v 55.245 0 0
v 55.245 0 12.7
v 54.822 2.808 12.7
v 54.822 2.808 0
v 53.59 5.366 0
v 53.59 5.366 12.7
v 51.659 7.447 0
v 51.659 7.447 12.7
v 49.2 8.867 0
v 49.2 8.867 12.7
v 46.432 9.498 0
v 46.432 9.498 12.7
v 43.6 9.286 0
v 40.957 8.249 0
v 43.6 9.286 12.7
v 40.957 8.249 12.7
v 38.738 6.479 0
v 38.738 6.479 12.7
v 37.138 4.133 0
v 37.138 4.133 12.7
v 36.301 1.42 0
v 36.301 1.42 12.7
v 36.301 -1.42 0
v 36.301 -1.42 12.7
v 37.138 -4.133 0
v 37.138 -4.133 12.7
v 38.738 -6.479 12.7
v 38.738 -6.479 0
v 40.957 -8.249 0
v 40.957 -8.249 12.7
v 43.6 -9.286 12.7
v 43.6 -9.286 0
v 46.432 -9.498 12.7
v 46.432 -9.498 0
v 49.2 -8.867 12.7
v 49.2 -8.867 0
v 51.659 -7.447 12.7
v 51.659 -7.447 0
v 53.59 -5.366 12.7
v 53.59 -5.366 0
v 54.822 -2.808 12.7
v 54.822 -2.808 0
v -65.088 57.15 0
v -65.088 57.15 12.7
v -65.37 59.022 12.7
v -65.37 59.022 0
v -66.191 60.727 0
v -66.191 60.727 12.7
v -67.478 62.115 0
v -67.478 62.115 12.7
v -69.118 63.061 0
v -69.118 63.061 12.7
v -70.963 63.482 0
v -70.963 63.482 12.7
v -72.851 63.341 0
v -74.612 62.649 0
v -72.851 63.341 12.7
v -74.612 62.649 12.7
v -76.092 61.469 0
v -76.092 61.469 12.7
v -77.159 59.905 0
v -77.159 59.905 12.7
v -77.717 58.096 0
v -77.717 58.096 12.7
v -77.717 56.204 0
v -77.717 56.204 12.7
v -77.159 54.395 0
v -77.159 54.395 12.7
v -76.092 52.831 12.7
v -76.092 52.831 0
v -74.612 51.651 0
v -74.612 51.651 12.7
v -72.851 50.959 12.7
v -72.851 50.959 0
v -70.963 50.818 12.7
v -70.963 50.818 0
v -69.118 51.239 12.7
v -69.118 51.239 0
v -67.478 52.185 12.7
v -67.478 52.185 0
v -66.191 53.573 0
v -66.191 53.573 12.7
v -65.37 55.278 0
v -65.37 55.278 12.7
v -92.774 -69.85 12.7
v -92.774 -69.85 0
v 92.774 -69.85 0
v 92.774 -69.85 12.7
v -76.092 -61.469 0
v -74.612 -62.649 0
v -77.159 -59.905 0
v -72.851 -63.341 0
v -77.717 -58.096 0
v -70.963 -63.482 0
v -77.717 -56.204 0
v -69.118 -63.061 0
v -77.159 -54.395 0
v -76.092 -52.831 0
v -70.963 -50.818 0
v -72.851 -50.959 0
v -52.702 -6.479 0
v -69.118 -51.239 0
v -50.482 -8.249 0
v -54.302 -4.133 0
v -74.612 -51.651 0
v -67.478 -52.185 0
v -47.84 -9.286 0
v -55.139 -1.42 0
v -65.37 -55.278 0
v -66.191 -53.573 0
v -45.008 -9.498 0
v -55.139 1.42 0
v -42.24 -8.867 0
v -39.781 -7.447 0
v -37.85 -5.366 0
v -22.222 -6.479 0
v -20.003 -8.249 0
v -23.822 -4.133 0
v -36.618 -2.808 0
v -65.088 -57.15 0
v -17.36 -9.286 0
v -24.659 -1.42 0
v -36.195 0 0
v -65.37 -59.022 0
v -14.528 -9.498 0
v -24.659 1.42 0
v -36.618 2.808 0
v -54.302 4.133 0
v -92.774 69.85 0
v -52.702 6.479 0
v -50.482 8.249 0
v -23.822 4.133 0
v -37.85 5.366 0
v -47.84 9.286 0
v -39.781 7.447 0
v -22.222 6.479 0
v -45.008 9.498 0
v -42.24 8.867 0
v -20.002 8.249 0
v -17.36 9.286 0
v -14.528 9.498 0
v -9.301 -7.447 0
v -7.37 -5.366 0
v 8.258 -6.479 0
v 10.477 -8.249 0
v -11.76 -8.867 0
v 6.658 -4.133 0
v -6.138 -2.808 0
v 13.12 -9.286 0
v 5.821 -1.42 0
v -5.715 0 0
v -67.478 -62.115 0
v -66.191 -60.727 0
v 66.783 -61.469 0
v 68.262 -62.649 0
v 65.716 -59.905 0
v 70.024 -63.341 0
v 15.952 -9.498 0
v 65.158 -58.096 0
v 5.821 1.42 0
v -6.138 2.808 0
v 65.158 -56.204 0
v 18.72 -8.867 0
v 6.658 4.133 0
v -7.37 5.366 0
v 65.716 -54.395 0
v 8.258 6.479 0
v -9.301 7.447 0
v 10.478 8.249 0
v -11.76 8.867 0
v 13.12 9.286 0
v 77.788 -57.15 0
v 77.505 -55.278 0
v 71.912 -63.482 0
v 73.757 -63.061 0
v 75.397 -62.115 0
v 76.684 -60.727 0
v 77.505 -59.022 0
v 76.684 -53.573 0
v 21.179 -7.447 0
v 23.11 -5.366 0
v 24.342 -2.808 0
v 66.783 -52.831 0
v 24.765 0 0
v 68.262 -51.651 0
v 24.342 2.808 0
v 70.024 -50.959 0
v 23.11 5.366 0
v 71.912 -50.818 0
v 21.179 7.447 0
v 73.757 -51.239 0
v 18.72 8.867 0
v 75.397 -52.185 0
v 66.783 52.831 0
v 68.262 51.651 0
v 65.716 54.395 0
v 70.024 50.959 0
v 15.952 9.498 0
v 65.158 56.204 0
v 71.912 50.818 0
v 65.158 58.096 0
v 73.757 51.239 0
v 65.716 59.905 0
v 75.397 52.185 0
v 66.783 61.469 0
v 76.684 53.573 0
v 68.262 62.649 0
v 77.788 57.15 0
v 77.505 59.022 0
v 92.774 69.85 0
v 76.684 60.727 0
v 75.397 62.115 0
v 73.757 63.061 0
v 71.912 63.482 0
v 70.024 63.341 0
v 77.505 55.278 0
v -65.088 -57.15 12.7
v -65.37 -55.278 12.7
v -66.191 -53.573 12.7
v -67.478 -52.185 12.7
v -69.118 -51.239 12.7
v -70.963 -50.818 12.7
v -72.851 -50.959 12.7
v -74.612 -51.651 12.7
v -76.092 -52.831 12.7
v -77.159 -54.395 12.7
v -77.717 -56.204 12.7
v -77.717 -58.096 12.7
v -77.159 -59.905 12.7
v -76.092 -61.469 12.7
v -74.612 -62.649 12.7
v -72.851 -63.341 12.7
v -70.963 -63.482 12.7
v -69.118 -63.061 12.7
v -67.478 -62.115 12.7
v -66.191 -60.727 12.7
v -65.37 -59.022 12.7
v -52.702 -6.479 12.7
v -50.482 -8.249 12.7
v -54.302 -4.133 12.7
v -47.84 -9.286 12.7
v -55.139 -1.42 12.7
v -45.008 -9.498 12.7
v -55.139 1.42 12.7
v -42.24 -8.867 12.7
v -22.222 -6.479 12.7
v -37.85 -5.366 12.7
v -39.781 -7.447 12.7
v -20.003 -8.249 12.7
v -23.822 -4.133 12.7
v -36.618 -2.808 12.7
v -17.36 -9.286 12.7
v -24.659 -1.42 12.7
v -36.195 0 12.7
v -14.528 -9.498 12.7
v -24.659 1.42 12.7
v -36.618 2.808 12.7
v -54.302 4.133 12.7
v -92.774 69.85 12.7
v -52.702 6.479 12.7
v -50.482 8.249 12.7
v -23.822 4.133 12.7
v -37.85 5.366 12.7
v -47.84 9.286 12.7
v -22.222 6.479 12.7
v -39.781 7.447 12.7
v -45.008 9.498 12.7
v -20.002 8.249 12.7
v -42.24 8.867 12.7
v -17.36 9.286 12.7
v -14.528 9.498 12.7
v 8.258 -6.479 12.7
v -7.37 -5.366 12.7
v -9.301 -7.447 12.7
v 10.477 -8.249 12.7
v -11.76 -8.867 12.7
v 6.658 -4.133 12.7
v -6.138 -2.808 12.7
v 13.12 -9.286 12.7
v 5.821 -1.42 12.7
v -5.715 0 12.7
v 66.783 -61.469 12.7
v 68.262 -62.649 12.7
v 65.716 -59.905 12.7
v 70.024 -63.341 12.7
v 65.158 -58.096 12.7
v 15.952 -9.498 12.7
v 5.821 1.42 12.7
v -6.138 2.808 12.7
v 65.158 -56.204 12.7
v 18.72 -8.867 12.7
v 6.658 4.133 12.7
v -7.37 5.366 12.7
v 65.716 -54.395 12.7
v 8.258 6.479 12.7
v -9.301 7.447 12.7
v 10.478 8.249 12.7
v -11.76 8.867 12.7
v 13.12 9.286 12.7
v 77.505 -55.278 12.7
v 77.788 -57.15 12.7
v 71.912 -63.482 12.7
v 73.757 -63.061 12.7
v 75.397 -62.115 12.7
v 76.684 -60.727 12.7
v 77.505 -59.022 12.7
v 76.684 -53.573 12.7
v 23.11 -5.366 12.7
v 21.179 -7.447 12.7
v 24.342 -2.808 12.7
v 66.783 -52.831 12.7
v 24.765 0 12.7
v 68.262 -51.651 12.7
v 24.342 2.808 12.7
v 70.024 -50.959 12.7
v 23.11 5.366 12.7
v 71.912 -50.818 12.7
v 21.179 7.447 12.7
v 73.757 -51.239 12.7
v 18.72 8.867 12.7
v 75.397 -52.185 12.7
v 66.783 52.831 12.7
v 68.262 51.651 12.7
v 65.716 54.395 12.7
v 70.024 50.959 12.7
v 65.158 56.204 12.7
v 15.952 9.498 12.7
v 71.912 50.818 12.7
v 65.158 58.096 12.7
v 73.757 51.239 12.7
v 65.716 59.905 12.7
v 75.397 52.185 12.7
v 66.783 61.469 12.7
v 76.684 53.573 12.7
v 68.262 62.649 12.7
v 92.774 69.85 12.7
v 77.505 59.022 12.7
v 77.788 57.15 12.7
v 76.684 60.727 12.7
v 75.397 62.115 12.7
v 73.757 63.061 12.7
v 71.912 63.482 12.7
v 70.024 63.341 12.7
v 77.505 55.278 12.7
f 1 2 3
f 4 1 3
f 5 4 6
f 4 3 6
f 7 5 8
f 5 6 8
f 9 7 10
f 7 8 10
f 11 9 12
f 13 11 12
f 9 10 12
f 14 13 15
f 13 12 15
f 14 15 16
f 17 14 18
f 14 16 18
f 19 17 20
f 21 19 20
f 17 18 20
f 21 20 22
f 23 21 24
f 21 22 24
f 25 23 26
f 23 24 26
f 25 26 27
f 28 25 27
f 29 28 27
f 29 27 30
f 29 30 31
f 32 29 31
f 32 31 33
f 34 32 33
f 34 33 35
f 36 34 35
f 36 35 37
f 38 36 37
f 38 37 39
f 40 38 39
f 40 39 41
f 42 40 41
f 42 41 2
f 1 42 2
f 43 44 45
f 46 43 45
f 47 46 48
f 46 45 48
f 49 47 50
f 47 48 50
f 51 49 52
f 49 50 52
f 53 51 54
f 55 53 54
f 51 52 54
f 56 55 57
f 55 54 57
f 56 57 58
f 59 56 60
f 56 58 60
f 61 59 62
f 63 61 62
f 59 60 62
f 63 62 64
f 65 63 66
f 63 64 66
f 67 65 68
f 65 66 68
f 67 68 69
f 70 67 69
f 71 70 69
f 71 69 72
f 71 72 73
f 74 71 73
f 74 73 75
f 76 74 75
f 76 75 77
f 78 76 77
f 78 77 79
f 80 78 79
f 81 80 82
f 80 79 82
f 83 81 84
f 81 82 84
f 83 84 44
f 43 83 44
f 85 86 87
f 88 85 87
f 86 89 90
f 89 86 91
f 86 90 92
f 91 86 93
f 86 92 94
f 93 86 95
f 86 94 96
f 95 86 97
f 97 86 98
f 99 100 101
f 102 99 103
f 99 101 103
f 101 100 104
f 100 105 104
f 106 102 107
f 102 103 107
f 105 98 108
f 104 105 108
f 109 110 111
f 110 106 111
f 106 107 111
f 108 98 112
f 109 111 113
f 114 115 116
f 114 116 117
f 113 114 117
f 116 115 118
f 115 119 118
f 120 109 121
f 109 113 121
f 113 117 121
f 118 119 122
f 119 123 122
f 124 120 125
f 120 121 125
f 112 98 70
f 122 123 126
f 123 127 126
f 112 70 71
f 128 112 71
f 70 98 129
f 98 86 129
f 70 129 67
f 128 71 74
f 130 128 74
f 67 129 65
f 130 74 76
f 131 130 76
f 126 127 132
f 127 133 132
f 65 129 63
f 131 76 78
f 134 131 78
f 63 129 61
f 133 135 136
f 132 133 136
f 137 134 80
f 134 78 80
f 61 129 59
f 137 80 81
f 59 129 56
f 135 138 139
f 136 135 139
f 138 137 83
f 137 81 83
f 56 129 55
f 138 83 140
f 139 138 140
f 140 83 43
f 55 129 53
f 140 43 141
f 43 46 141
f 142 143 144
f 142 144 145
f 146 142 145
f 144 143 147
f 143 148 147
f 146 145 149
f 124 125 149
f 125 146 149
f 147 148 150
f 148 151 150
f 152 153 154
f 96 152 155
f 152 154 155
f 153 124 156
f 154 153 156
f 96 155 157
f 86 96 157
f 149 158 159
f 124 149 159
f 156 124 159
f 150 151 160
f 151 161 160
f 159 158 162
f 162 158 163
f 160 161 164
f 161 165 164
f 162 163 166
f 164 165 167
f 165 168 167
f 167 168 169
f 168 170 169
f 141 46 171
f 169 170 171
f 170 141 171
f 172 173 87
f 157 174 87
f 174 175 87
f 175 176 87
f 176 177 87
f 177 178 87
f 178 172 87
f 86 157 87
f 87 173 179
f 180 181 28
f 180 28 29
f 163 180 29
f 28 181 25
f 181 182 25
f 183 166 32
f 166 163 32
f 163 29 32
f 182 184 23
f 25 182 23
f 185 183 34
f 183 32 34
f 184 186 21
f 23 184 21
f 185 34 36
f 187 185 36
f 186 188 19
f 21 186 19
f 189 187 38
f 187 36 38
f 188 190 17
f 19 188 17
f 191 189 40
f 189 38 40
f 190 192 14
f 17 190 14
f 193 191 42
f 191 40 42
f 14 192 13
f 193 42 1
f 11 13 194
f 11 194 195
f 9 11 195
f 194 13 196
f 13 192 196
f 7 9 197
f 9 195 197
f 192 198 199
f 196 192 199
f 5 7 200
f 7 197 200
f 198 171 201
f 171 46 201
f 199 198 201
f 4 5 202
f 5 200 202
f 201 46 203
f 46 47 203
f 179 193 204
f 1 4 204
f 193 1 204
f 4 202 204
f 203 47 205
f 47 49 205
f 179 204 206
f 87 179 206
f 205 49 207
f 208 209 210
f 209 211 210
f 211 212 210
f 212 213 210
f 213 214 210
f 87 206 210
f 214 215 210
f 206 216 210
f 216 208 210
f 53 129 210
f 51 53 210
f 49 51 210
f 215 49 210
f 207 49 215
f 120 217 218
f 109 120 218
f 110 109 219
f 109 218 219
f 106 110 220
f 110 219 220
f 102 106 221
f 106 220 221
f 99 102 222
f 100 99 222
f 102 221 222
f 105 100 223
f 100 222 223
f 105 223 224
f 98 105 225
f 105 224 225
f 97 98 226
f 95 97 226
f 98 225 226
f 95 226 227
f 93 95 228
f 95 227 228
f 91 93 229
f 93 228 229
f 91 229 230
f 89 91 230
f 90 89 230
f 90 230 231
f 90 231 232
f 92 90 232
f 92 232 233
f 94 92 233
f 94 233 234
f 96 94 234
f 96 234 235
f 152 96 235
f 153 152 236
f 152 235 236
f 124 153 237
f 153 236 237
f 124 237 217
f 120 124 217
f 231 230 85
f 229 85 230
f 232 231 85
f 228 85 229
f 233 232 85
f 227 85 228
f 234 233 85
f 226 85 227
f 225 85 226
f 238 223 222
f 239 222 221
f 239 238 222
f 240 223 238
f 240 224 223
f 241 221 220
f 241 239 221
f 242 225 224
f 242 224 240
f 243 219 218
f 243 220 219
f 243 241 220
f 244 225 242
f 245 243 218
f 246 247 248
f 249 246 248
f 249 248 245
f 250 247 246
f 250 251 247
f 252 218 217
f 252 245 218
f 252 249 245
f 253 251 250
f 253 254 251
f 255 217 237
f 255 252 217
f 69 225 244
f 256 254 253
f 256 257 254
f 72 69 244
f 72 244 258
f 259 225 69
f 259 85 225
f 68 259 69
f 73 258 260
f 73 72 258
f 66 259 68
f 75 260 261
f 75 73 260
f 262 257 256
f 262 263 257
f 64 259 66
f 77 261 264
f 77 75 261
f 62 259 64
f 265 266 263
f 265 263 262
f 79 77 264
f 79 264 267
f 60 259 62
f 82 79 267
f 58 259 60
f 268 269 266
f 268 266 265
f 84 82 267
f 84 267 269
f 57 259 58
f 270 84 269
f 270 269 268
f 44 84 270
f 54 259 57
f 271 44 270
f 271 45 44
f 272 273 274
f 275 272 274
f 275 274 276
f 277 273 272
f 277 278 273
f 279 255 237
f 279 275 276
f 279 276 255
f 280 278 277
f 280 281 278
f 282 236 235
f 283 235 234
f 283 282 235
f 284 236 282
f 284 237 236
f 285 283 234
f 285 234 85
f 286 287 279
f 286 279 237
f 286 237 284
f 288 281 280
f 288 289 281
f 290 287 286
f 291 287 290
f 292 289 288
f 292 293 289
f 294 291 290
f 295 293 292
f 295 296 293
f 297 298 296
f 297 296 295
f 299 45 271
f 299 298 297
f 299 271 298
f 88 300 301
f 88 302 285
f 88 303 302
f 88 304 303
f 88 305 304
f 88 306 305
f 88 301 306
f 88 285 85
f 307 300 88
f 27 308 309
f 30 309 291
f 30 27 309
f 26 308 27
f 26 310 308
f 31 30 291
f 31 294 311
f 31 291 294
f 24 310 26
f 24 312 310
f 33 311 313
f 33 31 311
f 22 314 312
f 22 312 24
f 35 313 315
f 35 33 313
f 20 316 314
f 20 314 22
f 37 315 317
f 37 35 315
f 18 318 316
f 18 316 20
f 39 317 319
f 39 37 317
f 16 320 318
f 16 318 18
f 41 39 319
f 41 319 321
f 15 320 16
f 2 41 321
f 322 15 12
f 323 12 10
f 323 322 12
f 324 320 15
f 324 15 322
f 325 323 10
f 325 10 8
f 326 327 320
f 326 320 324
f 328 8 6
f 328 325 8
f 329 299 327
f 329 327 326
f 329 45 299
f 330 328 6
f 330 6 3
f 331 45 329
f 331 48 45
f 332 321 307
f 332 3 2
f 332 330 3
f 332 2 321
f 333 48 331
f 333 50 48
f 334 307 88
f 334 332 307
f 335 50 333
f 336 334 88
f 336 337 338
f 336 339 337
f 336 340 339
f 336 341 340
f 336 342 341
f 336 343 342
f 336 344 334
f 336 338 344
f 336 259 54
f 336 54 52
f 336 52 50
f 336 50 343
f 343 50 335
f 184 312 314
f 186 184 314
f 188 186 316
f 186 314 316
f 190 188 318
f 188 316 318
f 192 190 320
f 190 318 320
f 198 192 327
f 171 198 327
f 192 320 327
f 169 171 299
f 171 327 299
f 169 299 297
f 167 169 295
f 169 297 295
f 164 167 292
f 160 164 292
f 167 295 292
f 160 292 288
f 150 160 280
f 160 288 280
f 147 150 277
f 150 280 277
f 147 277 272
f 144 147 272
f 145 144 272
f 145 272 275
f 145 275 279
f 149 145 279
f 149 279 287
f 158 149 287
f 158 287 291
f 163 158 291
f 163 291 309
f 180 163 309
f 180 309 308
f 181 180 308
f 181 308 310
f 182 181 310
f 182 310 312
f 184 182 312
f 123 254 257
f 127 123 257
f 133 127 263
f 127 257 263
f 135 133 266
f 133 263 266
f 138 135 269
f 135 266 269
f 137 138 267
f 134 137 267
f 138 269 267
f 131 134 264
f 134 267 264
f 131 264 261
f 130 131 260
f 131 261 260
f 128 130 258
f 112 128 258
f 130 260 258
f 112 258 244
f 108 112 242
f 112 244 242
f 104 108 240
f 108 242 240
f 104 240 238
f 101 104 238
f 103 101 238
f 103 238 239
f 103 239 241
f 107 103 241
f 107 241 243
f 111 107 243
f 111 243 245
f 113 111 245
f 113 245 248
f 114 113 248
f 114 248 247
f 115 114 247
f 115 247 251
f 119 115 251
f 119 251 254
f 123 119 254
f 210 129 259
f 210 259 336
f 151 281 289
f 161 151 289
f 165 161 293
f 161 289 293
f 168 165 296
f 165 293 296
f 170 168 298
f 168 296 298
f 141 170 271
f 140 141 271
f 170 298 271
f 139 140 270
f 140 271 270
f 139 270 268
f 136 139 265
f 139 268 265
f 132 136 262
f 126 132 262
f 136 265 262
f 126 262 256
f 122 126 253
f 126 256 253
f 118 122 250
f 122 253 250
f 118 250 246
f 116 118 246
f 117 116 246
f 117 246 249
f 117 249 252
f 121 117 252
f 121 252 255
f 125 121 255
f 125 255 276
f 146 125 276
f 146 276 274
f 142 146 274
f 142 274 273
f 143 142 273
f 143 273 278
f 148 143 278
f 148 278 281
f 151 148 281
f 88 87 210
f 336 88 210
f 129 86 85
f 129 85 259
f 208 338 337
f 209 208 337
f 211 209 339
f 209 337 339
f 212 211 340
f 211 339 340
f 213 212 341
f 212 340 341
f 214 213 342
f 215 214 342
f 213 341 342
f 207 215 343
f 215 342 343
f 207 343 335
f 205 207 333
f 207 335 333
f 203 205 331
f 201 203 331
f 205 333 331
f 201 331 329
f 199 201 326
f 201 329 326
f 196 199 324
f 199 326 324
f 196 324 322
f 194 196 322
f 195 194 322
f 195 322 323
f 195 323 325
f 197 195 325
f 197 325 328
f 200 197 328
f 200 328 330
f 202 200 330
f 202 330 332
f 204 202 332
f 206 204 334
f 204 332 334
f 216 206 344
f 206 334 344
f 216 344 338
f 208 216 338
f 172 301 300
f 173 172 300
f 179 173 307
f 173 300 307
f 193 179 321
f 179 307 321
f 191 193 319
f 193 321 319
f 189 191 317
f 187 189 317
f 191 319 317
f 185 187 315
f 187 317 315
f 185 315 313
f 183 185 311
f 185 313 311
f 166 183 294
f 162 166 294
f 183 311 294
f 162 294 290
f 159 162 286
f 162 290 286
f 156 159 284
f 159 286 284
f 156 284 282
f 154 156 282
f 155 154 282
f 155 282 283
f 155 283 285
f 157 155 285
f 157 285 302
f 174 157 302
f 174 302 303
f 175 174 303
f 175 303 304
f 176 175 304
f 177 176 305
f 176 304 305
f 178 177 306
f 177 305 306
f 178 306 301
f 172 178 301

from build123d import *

# Parameters (mm, degrees)
SKETCH1_W           = 185.547
SKETCH1_H           = 139.7
BOSS_EXTRUDE1_DEPTH = 12.7
SKETCH2_R           = 9.525
CUT_EXTRUDE1_DEPTH  = 117.821379902
SKETCH3_R           = 6.35
CUT_EXTRUDE2_DEPTH  = 12.7


with BuildPart() as part:
    # Sketch1 → Boss-Extrude1 (new body)
    with BuildSketch(Plane.XY):
        Rectangle(SKETCH1_W, SKETCH1_H)
    extrude(amount=BOSS_EXTRUDE1_DEPTH)

    # Sketch2 → Cut-Extrude1 (cut, through all)
    with BuildSketch(Plane.XY.offset(12.7)):
        with Locations((-45.72, 0)):
            Circle(SKETCH2_R)
        with Locations((-15.24, 0)):
            Circle(SKETCH2_R)
        with Locations((15.24, 0)):
            Circle(SKETCH2_R)
        with Locations((45.72, 0)):
            Circle(SKETCH2_R)
    extrude(amount=-CUT_EXTRUDE1_DEPTH, mode=Mode.SUBTRACT)

    # Sketch3 → Cut-Extrude2 (cut)
    with BuildSketch(Plane.XY.offset(12.7)):
        with Locations((-71.4375, 57.15)):
            Circle(SKETCH3_R)
        with Locations((-71.4375, -57.15)):
            Circle(SKETCH3_R)
        with Locations((71.4375, 57.15)):
            Circle(SKETCH3_R)
        with Locations((71.4375, -57.15)):
            Circle(SKETCH3_R)
    extrude(amount=-CUT_EXTRUDE2_DEPTH, mode=Mode.SUBTRACT)


solid = part.part
